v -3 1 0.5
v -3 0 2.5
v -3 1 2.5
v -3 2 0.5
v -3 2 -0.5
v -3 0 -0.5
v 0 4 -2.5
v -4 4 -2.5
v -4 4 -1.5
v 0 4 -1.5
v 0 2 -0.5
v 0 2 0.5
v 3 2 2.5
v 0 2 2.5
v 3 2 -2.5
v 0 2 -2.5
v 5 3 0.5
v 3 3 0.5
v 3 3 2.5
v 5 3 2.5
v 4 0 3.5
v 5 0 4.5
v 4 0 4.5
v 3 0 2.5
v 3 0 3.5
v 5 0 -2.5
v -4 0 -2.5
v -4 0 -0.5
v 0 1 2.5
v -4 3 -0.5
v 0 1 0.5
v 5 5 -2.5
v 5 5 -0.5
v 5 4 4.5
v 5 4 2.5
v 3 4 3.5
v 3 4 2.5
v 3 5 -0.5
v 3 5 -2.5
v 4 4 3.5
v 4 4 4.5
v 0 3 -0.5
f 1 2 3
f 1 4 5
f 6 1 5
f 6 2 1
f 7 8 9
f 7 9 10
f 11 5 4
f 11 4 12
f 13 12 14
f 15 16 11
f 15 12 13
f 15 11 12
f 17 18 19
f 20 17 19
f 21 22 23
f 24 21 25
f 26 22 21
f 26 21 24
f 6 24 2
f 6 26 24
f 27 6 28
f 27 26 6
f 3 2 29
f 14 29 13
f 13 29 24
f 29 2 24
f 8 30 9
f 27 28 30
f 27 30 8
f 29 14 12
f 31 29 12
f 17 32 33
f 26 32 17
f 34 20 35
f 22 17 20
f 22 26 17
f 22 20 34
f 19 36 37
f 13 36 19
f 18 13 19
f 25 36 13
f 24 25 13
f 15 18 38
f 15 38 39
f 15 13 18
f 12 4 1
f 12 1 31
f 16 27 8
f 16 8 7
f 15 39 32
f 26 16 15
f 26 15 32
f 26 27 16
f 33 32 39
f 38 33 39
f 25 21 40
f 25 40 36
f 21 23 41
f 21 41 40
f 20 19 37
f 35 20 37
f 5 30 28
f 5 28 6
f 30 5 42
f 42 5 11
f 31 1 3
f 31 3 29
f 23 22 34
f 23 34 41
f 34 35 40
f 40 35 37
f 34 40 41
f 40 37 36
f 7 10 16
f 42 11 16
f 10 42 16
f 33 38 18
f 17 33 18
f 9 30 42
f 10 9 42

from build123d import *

# Parameters (mm, degrees)
SKETCH1_W           = 6
SKETCH1_H           = 5
BOSS_EXTRUDE1_DEPTH = 2
SKETCH2_W           = 4
SKETCH2_H           = 2
BOSS_EXTRUDE2_DEPTH = 4
CHAMFER1_SIZE       = 1
BOSS_EXTRUDE3_DEPTH = 5
CUT_EXTRUDE1_DEPTH  = 5
SKETCH6_W           = 3
SKETCH6_H           = 2
CUT_EXTRUDE2_DEPTH  = 1


with BuildPart() as part:
    # Sketch1 → Boss-Extrude1 (new body)
    with BuildSketch(Plane(origin=(0, 0, 0), x_dir=(1, 0, 0), z_dir=(0, 1, 0))):
        Rectangle(SKETCH1_W, SKETCH1_H)
    extrude(amount=BOSS_EXTRUDE1_DEPTH)

    # Sketch2 → Boss-Extrude2 (add)
    with BuildSketch(Plane(origin=(0, 0, 0), x_dir=(1, 0, 0), z_dir=(0, 1, 0))):
        with Locations((-2, 1.5)):
            Rectangle(SKETCH2_W, SKETCH2_H)
    extrude(amount=BOSS_EXTRUDE2_DEPTH)

    # Chamfer1
    chamfer1_edges = [part.edges().sort_by_distance(p)[0] for p in [
        (-2, 4, -0.5),
    ]]
    chamfer(chamfer1_edges, length=CHAMFER1_SIZE)

    # Sketch3 → Boss-Extrude3 (add)
    with BuildSketch(Plane(origin=(0, 0, 0), x_dir=(1, 0, 0), z_dir=(0, 1, 0))):
        Polygon((3, 2.5), (5, 2.5), (5, -4.5), (4, -4.5), (4, -3.5), (3, -3.5), align=None)
    extrude(amount=BOSS_EXTRUDE3_DEPTH)

    # Sketch5 → Cut-Extrude1 (cut)
    with BuildSketch(Plane.ZY.offset(-3)):
        Polygon((-0.5, 5), (0.5, 3), (2.5, 3), (2.5, 4), (5.863314104, 4), (5.863314104, 5.536679496), align=None)
    extrude(amount=-CUT_EXTRUDE1_DEPTH, mode=Mode.SUBTRACT)

    # Sketch6 → Cut-Extrude2 (cut)
    with BuildSketch(Plane(origin=(0, 2, 0), x_dir=(1, 0, 0), z_dir=(0, 1, 0))):
        with Locations((-1.5, -1.5)):
            Rectangle(SKETCH6_W, SKETCH6_H)
    extrude(amount=-CUT_EXTRUDE2_DEPTH, mode=Mode.SUBTRACT)


solid = part.part
